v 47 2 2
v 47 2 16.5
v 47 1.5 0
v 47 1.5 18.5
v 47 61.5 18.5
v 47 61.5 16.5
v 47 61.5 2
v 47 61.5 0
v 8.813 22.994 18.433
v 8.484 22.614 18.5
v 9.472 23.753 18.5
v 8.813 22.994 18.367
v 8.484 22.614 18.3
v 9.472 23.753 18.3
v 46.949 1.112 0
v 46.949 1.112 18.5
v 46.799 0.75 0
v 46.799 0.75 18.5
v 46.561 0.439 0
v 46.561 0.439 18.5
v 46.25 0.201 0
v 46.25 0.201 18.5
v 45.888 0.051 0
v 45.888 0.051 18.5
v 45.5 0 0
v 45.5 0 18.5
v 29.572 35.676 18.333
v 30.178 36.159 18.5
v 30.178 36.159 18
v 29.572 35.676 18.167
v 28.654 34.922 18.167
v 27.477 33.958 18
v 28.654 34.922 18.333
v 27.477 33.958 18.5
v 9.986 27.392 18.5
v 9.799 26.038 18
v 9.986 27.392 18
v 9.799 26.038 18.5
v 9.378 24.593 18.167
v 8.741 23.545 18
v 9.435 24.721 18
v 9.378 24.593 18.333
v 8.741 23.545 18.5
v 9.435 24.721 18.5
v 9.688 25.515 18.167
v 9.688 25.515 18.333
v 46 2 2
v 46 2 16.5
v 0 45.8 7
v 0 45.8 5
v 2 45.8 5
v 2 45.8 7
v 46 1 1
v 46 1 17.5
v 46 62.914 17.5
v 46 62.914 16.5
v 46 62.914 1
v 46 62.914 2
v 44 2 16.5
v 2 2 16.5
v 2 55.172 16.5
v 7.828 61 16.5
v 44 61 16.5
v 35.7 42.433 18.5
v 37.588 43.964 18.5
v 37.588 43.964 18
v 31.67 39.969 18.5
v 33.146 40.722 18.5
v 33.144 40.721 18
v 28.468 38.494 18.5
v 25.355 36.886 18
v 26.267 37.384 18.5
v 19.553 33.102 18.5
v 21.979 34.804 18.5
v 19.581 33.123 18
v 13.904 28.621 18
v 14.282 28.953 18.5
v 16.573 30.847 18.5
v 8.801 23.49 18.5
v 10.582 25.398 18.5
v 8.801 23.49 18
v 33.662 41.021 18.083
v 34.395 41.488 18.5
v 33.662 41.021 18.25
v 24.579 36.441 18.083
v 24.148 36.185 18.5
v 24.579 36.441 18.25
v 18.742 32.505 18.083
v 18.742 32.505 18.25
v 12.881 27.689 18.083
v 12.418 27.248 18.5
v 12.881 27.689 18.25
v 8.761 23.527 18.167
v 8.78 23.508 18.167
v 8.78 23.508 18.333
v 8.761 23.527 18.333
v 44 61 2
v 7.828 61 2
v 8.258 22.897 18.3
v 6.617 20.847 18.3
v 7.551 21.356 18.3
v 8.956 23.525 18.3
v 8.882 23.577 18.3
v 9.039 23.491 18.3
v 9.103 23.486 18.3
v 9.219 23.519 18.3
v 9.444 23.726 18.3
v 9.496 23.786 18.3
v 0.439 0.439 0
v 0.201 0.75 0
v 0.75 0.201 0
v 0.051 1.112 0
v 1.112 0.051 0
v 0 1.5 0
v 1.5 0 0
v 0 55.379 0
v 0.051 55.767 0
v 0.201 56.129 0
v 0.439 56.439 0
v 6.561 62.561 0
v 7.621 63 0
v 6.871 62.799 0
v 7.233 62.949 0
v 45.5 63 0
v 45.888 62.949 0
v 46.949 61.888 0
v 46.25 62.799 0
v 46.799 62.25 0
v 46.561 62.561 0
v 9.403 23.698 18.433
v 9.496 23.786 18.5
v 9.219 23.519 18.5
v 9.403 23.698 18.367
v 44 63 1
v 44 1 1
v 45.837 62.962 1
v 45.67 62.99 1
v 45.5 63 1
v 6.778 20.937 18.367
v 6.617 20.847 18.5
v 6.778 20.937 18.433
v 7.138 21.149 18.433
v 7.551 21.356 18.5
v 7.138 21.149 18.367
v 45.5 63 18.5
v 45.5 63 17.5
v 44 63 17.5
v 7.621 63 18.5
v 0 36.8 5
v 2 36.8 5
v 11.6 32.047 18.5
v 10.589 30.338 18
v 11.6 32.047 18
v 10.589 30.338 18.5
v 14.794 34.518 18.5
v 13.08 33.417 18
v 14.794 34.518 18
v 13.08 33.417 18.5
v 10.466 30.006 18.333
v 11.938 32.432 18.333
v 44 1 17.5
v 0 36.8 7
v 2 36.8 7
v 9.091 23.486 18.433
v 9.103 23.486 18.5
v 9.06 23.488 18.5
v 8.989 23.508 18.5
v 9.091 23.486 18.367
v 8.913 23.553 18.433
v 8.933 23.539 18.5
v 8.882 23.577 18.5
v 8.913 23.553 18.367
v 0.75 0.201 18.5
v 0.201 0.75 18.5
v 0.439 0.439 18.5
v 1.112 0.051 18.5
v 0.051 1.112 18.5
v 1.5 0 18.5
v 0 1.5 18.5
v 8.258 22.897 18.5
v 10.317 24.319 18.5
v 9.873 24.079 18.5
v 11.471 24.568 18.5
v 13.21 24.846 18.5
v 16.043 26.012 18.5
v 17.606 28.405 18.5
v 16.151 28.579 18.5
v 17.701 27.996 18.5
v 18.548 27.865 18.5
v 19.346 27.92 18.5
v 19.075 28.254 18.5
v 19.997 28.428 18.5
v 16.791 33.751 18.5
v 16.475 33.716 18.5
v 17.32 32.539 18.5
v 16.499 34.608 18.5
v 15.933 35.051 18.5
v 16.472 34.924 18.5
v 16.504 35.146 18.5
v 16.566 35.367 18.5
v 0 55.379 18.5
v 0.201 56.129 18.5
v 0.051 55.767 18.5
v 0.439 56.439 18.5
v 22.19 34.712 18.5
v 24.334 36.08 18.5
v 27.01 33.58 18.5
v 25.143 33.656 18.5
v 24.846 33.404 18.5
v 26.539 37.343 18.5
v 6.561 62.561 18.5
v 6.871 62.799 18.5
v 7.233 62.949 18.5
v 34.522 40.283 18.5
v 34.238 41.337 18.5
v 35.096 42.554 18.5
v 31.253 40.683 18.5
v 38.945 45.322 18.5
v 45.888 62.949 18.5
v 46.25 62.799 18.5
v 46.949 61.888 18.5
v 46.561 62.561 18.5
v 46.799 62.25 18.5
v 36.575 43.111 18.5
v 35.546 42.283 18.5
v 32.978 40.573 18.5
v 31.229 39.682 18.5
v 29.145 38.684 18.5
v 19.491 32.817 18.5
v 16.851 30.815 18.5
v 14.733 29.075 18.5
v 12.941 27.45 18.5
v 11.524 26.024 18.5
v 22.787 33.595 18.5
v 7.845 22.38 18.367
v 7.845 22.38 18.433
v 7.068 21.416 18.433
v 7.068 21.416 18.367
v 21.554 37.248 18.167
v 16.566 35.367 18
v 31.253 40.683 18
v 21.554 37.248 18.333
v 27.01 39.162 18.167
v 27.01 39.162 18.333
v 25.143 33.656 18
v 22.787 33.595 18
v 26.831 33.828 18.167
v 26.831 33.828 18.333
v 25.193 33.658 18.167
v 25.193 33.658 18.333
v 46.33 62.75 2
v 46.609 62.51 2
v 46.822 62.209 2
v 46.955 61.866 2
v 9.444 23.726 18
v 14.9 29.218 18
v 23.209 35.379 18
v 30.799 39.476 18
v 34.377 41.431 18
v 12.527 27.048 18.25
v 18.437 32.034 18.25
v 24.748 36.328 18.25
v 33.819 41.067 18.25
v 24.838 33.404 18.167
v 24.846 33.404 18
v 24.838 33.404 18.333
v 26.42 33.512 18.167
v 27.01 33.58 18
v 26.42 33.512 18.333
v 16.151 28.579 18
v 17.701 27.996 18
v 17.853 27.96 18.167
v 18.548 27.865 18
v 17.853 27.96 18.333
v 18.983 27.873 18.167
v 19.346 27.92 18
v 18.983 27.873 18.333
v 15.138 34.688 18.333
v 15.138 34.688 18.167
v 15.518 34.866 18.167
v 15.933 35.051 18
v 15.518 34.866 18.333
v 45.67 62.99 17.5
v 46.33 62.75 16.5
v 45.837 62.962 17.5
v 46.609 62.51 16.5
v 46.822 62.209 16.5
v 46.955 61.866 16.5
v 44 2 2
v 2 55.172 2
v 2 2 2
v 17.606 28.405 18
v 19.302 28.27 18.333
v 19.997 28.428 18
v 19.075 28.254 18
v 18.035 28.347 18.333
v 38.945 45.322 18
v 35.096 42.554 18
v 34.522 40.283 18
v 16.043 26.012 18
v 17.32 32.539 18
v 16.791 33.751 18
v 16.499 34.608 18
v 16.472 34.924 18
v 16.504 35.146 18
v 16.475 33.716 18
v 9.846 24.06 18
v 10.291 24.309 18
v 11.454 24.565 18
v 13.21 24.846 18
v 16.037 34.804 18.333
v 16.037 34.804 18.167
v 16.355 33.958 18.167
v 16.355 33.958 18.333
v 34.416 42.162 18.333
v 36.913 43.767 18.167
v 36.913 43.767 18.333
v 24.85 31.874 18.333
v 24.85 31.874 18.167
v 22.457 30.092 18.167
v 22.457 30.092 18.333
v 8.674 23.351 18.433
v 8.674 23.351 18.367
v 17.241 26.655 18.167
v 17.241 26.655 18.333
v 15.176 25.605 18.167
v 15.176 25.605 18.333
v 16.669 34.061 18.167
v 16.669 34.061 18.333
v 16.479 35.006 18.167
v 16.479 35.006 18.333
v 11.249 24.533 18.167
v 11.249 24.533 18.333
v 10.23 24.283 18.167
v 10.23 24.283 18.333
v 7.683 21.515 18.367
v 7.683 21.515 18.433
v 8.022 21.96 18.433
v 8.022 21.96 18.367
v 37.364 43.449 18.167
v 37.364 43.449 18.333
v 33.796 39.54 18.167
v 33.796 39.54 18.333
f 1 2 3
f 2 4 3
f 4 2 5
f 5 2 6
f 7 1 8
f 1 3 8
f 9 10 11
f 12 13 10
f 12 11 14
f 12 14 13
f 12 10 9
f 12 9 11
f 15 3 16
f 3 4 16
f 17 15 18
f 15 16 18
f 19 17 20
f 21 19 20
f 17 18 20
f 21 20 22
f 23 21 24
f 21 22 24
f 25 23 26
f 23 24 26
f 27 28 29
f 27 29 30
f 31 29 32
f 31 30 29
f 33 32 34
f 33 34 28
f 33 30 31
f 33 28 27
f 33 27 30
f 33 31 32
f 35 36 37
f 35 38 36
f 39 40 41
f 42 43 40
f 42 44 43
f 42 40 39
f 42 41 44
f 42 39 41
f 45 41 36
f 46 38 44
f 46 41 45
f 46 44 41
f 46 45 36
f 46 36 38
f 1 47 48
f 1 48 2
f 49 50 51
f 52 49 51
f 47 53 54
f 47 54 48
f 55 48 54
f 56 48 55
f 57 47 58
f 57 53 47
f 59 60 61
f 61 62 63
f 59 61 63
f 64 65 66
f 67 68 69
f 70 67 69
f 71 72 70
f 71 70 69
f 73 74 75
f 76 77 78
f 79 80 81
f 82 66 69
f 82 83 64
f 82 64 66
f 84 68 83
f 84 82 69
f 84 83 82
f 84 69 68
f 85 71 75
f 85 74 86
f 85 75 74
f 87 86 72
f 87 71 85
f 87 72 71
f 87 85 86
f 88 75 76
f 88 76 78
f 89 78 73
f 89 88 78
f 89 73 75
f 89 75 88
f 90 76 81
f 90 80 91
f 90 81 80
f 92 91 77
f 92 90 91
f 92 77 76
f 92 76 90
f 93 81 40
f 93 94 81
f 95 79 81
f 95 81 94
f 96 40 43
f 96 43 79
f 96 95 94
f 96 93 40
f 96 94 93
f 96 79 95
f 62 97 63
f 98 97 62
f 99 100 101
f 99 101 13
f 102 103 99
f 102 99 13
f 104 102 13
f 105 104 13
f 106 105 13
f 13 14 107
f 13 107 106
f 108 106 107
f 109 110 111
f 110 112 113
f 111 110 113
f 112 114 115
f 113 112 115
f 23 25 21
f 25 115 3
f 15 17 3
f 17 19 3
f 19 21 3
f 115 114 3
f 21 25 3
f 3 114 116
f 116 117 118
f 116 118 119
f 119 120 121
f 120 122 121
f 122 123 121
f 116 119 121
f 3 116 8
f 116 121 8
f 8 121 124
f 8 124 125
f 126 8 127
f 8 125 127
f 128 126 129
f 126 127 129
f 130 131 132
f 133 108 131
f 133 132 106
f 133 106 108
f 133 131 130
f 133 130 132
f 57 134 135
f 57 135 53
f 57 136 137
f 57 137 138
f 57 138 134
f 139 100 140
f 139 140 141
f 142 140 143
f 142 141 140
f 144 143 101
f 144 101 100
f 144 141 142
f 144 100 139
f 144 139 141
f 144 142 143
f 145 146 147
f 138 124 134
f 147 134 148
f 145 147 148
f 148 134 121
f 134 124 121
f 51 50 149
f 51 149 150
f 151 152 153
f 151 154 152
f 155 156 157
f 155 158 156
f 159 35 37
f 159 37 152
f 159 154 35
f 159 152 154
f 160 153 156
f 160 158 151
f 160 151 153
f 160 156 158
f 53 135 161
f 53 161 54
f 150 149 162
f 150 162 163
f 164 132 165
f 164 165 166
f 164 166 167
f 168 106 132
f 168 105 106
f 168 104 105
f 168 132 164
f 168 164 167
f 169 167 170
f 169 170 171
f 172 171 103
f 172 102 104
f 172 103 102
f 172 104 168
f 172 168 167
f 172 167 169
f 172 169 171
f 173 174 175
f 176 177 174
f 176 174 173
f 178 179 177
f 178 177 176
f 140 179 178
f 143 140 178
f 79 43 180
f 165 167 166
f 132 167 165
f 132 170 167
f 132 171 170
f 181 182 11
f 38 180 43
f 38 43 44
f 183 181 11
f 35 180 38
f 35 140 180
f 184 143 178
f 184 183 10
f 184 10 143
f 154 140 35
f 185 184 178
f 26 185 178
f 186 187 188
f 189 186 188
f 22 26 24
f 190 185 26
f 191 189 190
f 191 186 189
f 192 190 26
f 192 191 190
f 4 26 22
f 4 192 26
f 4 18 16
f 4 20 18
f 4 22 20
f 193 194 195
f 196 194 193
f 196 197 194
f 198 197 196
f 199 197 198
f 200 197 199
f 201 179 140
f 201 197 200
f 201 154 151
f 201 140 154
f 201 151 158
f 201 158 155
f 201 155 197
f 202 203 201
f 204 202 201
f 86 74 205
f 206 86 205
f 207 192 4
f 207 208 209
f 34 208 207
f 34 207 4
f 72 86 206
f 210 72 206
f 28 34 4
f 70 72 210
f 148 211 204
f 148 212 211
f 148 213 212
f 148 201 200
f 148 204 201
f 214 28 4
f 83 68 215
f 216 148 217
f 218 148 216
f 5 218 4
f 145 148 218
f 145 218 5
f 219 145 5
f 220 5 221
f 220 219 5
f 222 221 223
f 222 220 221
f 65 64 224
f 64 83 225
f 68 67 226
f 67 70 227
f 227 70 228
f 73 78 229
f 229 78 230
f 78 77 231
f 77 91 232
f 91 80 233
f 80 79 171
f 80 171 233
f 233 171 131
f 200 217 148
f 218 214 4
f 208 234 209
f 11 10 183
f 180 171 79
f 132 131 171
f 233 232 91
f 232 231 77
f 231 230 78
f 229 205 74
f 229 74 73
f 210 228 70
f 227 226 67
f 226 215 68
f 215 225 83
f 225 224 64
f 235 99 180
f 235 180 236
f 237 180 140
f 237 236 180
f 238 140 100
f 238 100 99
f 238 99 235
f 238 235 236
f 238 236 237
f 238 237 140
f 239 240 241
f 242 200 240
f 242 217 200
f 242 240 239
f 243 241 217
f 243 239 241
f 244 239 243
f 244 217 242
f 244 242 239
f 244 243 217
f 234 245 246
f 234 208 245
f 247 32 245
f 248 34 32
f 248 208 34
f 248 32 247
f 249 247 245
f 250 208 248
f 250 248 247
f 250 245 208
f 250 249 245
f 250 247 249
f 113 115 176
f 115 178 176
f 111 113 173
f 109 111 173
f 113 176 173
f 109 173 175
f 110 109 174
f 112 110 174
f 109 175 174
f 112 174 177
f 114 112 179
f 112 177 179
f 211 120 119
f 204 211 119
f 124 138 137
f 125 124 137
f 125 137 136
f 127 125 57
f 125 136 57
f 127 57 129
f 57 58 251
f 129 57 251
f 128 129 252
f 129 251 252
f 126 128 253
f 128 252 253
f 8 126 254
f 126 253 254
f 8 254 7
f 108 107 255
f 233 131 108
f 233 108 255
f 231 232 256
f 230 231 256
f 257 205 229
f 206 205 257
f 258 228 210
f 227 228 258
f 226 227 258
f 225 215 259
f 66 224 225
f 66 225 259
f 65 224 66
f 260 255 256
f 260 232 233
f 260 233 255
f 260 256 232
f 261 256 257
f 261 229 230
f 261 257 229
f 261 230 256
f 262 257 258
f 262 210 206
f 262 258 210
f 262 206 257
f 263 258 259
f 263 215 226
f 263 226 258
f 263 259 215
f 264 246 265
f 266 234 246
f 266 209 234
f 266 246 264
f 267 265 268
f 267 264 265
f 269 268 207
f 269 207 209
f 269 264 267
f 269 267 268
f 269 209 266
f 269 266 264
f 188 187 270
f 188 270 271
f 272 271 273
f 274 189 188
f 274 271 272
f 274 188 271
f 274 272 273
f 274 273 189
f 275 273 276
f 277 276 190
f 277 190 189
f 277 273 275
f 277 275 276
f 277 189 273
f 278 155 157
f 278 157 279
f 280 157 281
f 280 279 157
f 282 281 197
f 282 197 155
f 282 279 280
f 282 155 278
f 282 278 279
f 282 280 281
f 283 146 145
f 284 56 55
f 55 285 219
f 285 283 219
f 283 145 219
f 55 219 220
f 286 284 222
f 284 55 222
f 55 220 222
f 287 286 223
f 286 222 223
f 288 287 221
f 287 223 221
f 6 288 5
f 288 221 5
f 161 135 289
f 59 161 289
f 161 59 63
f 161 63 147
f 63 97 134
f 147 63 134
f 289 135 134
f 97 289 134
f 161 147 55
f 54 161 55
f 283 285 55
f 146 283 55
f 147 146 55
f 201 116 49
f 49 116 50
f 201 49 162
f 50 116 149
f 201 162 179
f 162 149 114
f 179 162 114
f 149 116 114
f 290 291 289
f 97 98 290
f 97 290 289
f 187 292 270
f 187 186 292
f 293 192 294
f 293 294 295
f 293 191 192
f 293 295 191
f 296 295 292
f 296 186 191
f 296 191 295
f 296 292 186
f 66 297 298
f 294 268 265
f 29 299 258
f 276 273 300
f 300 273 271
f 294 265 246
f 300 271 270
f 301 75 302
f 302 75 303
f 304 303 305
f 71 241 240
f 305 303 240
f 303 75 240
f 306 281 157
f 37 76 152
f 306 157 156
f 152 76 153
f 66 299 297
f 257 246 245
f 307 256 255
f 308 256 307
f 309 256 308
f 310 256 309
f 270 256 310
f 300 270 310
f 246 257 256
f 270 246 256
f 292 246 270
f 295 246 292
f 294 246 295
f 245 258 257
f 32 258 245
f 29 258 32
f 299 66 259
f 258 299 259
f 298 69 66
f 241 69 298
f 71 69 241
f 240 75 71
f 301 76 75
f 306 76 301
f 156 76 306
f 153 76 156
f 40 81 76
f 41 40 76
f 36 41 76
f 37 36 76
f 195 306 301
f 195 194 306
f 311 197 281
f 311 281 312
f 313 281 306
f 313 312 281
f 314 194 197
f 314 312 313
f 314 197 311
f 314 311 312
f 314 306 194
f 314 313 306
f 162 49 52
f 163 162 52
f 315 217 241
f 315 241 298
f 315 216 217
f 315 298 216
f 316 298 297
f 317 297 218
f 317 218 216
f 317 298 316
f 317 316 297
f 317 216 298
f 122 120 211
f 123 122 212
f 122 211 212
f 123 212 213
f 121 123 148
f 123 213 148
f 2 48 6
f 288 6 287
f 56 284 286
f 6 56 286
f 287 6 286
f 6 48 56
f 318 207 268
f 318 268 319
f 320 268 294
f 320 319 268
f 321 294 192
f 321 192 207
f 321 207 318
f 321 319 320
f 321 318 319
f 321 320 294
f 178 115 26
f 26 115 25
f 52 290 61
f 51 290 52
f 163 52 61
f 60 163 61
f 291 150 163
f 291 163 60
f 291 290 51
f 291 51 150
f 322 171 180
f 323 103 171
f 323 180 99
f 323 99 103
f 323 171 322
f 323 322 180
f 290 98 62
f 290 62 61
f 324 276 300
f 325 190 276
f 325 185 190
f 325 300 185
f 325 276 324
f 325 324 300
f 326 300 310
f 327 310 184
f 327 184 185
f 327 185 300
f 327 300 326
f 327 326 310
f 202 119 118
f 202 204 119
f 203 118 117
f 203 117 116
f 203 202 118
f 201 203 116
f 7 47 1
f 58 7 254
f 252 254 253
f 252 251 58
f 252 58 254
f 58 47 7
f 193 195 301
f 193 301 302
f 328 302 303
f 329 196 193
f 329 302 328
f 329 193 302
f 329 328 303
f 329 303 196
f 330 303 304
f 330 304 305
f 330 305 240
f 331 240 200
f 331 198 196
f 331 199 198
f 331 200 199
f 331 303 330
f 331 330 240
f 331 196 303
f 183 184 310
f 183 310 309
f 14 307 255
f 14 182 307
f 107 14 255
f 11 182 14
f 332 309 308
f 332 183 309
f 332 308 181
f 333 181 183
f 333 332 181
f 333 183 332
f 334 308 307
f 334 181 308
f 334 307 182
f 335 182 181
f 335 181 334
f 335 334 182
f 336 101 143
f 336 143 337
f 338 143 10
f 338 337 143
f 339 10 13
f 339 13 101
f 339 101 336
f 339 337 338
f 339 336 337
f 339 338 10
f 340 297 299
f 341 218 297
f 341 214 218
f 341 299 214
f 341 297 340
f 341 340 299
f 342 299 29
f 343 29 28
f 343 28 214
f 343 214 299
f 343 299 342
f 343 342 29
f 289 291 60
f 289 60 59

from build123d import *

# Parameters (mm, degrees)
BOSS_EXTRU_1_DEPTH            = 18.5
ESQUISSE5_W                   = 18.5
ESQUISSE5_H                   = 9.899494937
BOSS_EXTRU_3_DEPTH            = 1.5
CONG_1_R                      = 1.5
ENL_V_MAT_EXTRU_7_DEPTH       = 0.5
ENL_V_MAT_EXTRU_9_DEPTH       = 0.2
ENL_V_START                   = -2
ENL_V_MAT_EXTRU_10_DEPTH      = 14.5
ENL_V_MAT_EXTRU_11_DEPTH      = 15.5
ENL_V_MAT_EXTRU_11_DEPTH_BACK = 1
ESQUISSE11_W                  = 2
ESQUISSE11_H                  = 66.45046337
ESQUISSE12_W                  = 2.477505898
ESQUISSE12_H                  = 3.959677151
ENL_V_MAT_EXTRU_12_DEPTH      = 14.5
ENL_V_START_2                 = 3
ESQUISSE13_W                  = 2
ESQUISSE13_H                  = 9
ENL_V_MAT_EXTRU_13_DEPTH      = 2


with BuildPart() as part:
    # Esquisse1 → Boss.-Extru.1 (new body)
    with BuildSketch(Plane.XY):
        Polygon((7, 63), (0, 56), (0, 0), (47, 0), (47, 63), align=None)
    extrude(amount=BOSS_EXTRU_1_DEPTH)

    # Esquisse5 → Boss.-Extru.3 (add)
    with BuildSketch(Plane(origin=(-28, 28, 0), x_dir=(0, 0, 1), z_dir=(-0.707106781186549, 0.7071067811865462, 0))):
        with Locations((9.25, 44.547727215)):
            Rectangle(ESQUISSE5_W, ESQUISSE5_H)
    extrude(amount=-BOSS_EXTRU_3_DEPTH)

    # Congé1
    cong_1_edges = [part.edges().sort_by_distance(p)[0] for p in [
        (0, 0, 9.25),
        (47, 0, 9.25),
        (47, 63, 9.25),
        (0, 56, 9.25),
        (7, 63, 9.25),
    ]]
    fillet(cong_1_edges, radius=CONG_1_R)

    # Esquisse7 → Enlèv. mat.-Extru.7 (cut)
    with BuildSketch(Plane.XY.offset(18.5)):
        with BuildLine():
            add(Edge.make_bspline(
                [(8.741481422, 23.545339958), (8.97426544, 23.884234425), (9.391722632, 24.491982042), (9.801234093, 25.809520444), (9.912339585, 26.761676513), (9.985835627, 27.391525683)],
                knots=[0, 0, 0, 0, 0.299076085, 0.536340353, 1, 1, 1, 1], degree=3))
            add(Edge.make_bspline(
                [(8.800690837, 23.490312703), (8.780021094, 23.50796535), (8.760751258, 23.526652654), (8.741481422, 23.545339958)],
                knots=[0.816445355, 0.816445355, 0.816445355, 0.816445355, 1, 1, 1, 1], degree=3))
            add(Edge.make_bspline(
                [(37.587874359, 43.964061233), (36.322453208, 42.912301808), (33.856892738, 40.863042189), (29.192246001, 38.90002762), (24.068252551, 36.312701669), (18.552137849, 32.455332186), (13.189313268, 28.201783406), (10.124203366, 24.92862823), (8.800690837, 23.490312703)],
                knots=[0, 0, 0, 0, 0.134488449, 0.262038771, 0.413324325, 0.606278792, 0.814215894, 0.974718857, 0.974718857, 0.974718857, 0.974718857], degree=3))
            add(Edge.make_bspline(
                [(9.443588409, 23.726318154), (10.439928849, 24.865322019), (13.17889562, 27.902664607), (18.360152512, 32.08462974), (24.147814444, 36.14388912), (29.439325332, 38.879729859), (34.023974897, 40.940579508), (36.372875034, 42.933300323), (37.587874359, 43.964061233)],
                knots=[0.043476968, 0.043476968, 0.043476968, 0.043476968, 0.167785205, 0.379770977, 0.589080615, 0.748039182, 0.869669971, 1, 1, 1, 1], degree=3))
            add(Edge.make_bspline(
                [(13.209844249, 24.846255718), (12.561216207, 24.741866177), (11.570036096, 24.582346652), (10.21413428, 24.371732671), (9.686497603, 23.950548462), (9.443588409, 23.726318154)],
                knots=[0, 0, 0, 0, 0.449393835, 0.686726756, 0.906490115, 0.906490115, 0.906490115, 0.906490115], degree=3))
            add(Edge.make_bspline(
                [(19.346207327, 27.92037622), (18.649539489, 27.490364128), (17.295751274, 26.654750267), (15.259428846, 25.586185129), (13.871062619, 25.084965025), (13.209844249, 24.846255718)],
                knots=[0, 0, 0, 0, 0.357022344, 0.693777745, 1, 1, 1, 1], degree=3))
            add(Edge.make_bspline(
                [(16.151045098, 28.579318334), (16.706508218, 28.335383374), (17.609553302, 27.93880571), (18.730896282, 27.827227889), (19.225451429, 27.902095693), (19.346207327, 27.92037622)],
                knots=[0, 0, 0, 0, 0.547075637, 0.889409121, 1, 1, 1, 1], degree=3))
            add(Edge.make_bspline(
                [(19.997230823, 28.428298982), (19.766755369, 28.36324029), (19.12544327, 28.182210485), (17.819957633, 28.388483473), (16.776288941, 28.507823681), (16.151045098, 28.579318334)],
                knots=[0, 0, 0, 0, 0.183614026, 0.510917298, 1, 1, 1, 1], degree=3))
            add(Edge.make_bspline(
                [(27.009732384, 33.579925392), (26.292485205, 33.007945409), (24.797708149, 31.815912062), (22.478329122, 30.069627859), (20.822964986, 28.974549539), (19.997230823, 28.428298982)],
                knots=[0, 0, 0, 0, 0.316155138, 0.658882265, 1, 1, 1, 1], degree=3))
            add(Edge.make_bspline(
                [(22.78741232, 33.594631396), (23.47035804, 33.500852352), (24.67880724, 33.334913527), (26.092254902, 33.472354396), (26.813238587, 33.556887188), (27.009732384, 33.579925392)],
                knots=[0, 0, 0, 0, 0.485970736, 0.859908672, 1, 1, 1, 1], degree=3))
            add(Edge.make_bspline(
                [(27.476930827, 33.958322193), (27.261994438, 33.912287048), (26.51014109, 33.751254856), (24.939704804, 33.622032753), (23.589244994, 33.604839722), (22.78741232, 33.594631396)],
                knots=[0, 0, 0, 0, 0.139880518, 0.489305866, 1, 1, 1, 1], degree=3))
            add(Edge.make_bspline(
                [(30.178310683, 36.158566674), (29.975674371, 35.998229226), (29.462468598, 35.592151447), (28.569556831, 34.84941734), (27.869795727, 34.278724604), (27.476930827, 33.958322193)],
                knots=[0, 0, 0, 0, 0.222488299, 0.563483801, 1, 1, 1, 1], degree=3))
            add(Edge.make_bspline(
                [(38.945351674, 45.321538548), (38.420171007, 44.695713388), (36.761155938, 42.718768237), (33.941660103, 39.55384301), (31.404658543, 37.264972007), (30.178310683, 36.158566674)],
                knots=[0, 0, 0, 0, 0.193087, 0.609950563, 1, 1, 1, 1], degree=3))
            add(Edge.make_bspline(
                [(31.252980224, 40.683491056), (32.324827658, 41.14326203), (34.307774375, 41.993850755), (36.826194398, 43.657503938), (38.274775575, 44.794979312), (38.945351674, 45.321538548)],
                knots=[0, 0, 0, 0, 0.387194684, 0.716320628, 1, 1, 1, 1], degree=3))
            add(Edge.make_bspline(
                [(16.565641294, 35.366704907), (18.224543129, 36.00479534), (21.682233863, 37.334783247), (26.615085728, 39.004604912), (29.840038582, 40.172015828), (31.252980224, 40.683491056)],
                knots=[0, 0, 0, 0, 0.341315206, 0.711411851, 1, 1, 1, 1], degree=3))
            add(Edge.make_bspline(
                [(17.320172435, 32.538627168), (17.095643767, 33.034221194), (16.740497225, 33.818123337), (16.398777614, 34.815395743), (16.52931247, 35.246676309), (16.565641294, 35.366704907)],
                knots=[0, 0, 0, 0, 0.553685075, 0.875787227, 1, 1, 1, 1], degree=3))
            add(Edge.make_bspline(
                [(15.932717497, 35.050525816), (15.968390486, 34.968733309), (16.124488937, 34.610824317), (16.392954493, 33.675509429), (16.95320176, 32.988577964), (17.320172435, 32.538627168)],
                knots=[0, 0, 0, 0, 0.092717793, 0.405716039, 1, 1, 1, 1], degree=3))
            add(Edge.make_bspline(
                [(14.793567783, 34.518281585), (14.908073567, 34.57528331), (15.147913789, 34.694677334), (15.52805859, 34.871411668), (15.794398468, 34.989301673), (15.932717497, 35.050525816)],
                knots=[0, 0, 0, 0, 0.305139846, 0.639136348, 1, 1, 1, 1], degree=3))
            add(Edge.make_bspline(
                [(9.985835627, 27.391525683), (10.083402404, 28.278864149), (10.285137329, 30.113578429), (11.930749087, 32.794310056), (13.772036135, 33.90312161), (14.793567783, 34.518281585)],
                knots=[0, 0, 0, 0, 0.294280708, 0.608472459, 1, 1, 1, 1], degree=3))
        make_face()
    extrude(amount=-ENL_V_MAT_EXTRU_7_DEPTH, mode=Mode.SUBTRACT)

    # Esquisse8 → Enlèv. mat.-Extru.9 (cut)
    with BuildSketch(Plane.XY.offset(18.5)):
        with BuildLine():
            add(Edge.make_bspline(
                [(9.219208695, 23.519291104), (9.176868463, 23.503048303), (9.073549799, 23.463412607), (8.952624188, 23.520506831), (8.89240353, 23.568918106), (8.882487226, 23.577386959)],
                knots=[0, 0, 0, 0, 0.298493917, 0.728385063, 0.816445355, 0.816445355, 0.816445355, 0.816445355], degree=3))
            add(Edge.make_bspline(
                [(8.882487226, 23.577386959), (8.674018118, 23.350835), (8.465840191, 23.123974501), (8.257662264, 22.897114002)],
                knots=[0.974718857, 0.974718857, 0.974718857, 0.974718857, 1, 1, 1, 1], degree=3))
            add(Edge.make_bspline(
                [(8.257662264, 22.897114002), (8.120380319, 22.724431783), (7.726303318, 22.228735927), (7.172014223, 21.551305412), (6.767070551, 21.036911066), (6.617377175, 20.846757641)],
                knots=[0, 0, 0, 0, 0.25204317, 0.723506773, 1, 1, 1, 1], degree=3))
            add(Edge.make_bspline(
                [(6.617377175, 20.846757641), (6.67105197, 20.876575617), (6.846524977, 20.974056193), (7.146714282, 21.163568152), (7.411642244, 21.289656477), (7.550642829, 21.355811634)],
                knots=[0, 0, 0, 0, 0.173191566, 0.566195825, 1, 1, 1, 1], degree=3))
            add(Edge.make_bspline(
                [(7.550642829, 21.355811634), (7.594875595, 21.408819409), (7.758493986, 21.604896833), (8.073049619, 22.022428419), (8.331605023, 22.394899892), (8.483908483, 22.614306228)],
                knots=[0, 0, 0, 0, 0.132137543, 0.488780926, 1, 1, 1, 1], degree=3))
            add(Edge.make_bspline(
                [(8.483908483, 22.614306228), (8.830410957, 23.014665275), (9.176913431, 23.415024323), (9.525384799, 23.813392409)],
                knots=[0, 0, 0, 0, 0.043476968, 0.043476968, 0.043476968, 0.043476968], degree=3))
            add(Edge.make_bspline(
                [(9.525384799, 23.813392409), (9.422026301, 23.717981826), (9.320617498, 23.618636465), (9.219208695, 23.519291104)],
                knots=[0.906490115, 0.906490115, 0.906490115, 0.906490115, 1, 1, 1, 1], degree=3))
        make_face()
    extrude(amount=-ENL_V_MAT_EXTRU_9_DEPTH, mode=Mode.SUBTRACT)

    # Esquisse10 → Enlèv. mat.-Extru.10 (cut)
    with BuildSketch(Plane(origin=(0, 0, 0), x_dir=(-1, 0, 0), z_dir=(0, 0, -1)).offset(ENL_V_START)):
        Polygon((-47.600891072, 61), (-7.828427125, 61), (-2, 55.171572875), (-2, 2), (-47.600891072, 2), align=None)
    extrude(amount=-ENL_V_MAT_EXTRU_10_DEPTH, mode=Mode.SUBTRACT)

    # Esquisse11 → Enlèv. mat.-Extru.11 (cut, two sides: drawn at the far end of the back side and taken through both)
    with BuildSketch(Plane.XY.offset(2).offset(-ENL_V_MAT_EXTRU_11_DEPTH_BACK)):
        with Locations((45, 34.225231685)):
            Rectangle(ESQUISSE11_W, ESQUISSE11_H)
    extrude(amount=ENL_V_MAT_EXTRU_11_DEPTH + ENL_V_MAT_EXTRU_11_DEPTH_BACK, mode=Mode.SUBTRACT)

    # Esquisse12 → Enlèv. mat.-Extru.12 (cut)
    with BuildSketch(Plane.XY.offset(2)):
        with Locations((47.238752949, 61.767431922)):
            Rectangle(ESQUISSE12_W, ESQUISSE12_H)
    extrude(amount=ENL_V_MAT_EXTRU_12_DEPTH, mode=Mode.SUBTRACT)

    # Esquisse13 → Enlèv. mat.-Extru.13 (cut)
    with BuildSketch(Plane.XY.offset(2).offset(ENL_V_START_2)):
        with Locations((1, 41.3)):
            Rectangle(ESQUISSE13_W, ESQUISSE13_H)
    extrude(amount=ENL_V_MAT_EXTRU_13_DEPTH, mode=Mode.SUBTRACT)


solid = part.part
